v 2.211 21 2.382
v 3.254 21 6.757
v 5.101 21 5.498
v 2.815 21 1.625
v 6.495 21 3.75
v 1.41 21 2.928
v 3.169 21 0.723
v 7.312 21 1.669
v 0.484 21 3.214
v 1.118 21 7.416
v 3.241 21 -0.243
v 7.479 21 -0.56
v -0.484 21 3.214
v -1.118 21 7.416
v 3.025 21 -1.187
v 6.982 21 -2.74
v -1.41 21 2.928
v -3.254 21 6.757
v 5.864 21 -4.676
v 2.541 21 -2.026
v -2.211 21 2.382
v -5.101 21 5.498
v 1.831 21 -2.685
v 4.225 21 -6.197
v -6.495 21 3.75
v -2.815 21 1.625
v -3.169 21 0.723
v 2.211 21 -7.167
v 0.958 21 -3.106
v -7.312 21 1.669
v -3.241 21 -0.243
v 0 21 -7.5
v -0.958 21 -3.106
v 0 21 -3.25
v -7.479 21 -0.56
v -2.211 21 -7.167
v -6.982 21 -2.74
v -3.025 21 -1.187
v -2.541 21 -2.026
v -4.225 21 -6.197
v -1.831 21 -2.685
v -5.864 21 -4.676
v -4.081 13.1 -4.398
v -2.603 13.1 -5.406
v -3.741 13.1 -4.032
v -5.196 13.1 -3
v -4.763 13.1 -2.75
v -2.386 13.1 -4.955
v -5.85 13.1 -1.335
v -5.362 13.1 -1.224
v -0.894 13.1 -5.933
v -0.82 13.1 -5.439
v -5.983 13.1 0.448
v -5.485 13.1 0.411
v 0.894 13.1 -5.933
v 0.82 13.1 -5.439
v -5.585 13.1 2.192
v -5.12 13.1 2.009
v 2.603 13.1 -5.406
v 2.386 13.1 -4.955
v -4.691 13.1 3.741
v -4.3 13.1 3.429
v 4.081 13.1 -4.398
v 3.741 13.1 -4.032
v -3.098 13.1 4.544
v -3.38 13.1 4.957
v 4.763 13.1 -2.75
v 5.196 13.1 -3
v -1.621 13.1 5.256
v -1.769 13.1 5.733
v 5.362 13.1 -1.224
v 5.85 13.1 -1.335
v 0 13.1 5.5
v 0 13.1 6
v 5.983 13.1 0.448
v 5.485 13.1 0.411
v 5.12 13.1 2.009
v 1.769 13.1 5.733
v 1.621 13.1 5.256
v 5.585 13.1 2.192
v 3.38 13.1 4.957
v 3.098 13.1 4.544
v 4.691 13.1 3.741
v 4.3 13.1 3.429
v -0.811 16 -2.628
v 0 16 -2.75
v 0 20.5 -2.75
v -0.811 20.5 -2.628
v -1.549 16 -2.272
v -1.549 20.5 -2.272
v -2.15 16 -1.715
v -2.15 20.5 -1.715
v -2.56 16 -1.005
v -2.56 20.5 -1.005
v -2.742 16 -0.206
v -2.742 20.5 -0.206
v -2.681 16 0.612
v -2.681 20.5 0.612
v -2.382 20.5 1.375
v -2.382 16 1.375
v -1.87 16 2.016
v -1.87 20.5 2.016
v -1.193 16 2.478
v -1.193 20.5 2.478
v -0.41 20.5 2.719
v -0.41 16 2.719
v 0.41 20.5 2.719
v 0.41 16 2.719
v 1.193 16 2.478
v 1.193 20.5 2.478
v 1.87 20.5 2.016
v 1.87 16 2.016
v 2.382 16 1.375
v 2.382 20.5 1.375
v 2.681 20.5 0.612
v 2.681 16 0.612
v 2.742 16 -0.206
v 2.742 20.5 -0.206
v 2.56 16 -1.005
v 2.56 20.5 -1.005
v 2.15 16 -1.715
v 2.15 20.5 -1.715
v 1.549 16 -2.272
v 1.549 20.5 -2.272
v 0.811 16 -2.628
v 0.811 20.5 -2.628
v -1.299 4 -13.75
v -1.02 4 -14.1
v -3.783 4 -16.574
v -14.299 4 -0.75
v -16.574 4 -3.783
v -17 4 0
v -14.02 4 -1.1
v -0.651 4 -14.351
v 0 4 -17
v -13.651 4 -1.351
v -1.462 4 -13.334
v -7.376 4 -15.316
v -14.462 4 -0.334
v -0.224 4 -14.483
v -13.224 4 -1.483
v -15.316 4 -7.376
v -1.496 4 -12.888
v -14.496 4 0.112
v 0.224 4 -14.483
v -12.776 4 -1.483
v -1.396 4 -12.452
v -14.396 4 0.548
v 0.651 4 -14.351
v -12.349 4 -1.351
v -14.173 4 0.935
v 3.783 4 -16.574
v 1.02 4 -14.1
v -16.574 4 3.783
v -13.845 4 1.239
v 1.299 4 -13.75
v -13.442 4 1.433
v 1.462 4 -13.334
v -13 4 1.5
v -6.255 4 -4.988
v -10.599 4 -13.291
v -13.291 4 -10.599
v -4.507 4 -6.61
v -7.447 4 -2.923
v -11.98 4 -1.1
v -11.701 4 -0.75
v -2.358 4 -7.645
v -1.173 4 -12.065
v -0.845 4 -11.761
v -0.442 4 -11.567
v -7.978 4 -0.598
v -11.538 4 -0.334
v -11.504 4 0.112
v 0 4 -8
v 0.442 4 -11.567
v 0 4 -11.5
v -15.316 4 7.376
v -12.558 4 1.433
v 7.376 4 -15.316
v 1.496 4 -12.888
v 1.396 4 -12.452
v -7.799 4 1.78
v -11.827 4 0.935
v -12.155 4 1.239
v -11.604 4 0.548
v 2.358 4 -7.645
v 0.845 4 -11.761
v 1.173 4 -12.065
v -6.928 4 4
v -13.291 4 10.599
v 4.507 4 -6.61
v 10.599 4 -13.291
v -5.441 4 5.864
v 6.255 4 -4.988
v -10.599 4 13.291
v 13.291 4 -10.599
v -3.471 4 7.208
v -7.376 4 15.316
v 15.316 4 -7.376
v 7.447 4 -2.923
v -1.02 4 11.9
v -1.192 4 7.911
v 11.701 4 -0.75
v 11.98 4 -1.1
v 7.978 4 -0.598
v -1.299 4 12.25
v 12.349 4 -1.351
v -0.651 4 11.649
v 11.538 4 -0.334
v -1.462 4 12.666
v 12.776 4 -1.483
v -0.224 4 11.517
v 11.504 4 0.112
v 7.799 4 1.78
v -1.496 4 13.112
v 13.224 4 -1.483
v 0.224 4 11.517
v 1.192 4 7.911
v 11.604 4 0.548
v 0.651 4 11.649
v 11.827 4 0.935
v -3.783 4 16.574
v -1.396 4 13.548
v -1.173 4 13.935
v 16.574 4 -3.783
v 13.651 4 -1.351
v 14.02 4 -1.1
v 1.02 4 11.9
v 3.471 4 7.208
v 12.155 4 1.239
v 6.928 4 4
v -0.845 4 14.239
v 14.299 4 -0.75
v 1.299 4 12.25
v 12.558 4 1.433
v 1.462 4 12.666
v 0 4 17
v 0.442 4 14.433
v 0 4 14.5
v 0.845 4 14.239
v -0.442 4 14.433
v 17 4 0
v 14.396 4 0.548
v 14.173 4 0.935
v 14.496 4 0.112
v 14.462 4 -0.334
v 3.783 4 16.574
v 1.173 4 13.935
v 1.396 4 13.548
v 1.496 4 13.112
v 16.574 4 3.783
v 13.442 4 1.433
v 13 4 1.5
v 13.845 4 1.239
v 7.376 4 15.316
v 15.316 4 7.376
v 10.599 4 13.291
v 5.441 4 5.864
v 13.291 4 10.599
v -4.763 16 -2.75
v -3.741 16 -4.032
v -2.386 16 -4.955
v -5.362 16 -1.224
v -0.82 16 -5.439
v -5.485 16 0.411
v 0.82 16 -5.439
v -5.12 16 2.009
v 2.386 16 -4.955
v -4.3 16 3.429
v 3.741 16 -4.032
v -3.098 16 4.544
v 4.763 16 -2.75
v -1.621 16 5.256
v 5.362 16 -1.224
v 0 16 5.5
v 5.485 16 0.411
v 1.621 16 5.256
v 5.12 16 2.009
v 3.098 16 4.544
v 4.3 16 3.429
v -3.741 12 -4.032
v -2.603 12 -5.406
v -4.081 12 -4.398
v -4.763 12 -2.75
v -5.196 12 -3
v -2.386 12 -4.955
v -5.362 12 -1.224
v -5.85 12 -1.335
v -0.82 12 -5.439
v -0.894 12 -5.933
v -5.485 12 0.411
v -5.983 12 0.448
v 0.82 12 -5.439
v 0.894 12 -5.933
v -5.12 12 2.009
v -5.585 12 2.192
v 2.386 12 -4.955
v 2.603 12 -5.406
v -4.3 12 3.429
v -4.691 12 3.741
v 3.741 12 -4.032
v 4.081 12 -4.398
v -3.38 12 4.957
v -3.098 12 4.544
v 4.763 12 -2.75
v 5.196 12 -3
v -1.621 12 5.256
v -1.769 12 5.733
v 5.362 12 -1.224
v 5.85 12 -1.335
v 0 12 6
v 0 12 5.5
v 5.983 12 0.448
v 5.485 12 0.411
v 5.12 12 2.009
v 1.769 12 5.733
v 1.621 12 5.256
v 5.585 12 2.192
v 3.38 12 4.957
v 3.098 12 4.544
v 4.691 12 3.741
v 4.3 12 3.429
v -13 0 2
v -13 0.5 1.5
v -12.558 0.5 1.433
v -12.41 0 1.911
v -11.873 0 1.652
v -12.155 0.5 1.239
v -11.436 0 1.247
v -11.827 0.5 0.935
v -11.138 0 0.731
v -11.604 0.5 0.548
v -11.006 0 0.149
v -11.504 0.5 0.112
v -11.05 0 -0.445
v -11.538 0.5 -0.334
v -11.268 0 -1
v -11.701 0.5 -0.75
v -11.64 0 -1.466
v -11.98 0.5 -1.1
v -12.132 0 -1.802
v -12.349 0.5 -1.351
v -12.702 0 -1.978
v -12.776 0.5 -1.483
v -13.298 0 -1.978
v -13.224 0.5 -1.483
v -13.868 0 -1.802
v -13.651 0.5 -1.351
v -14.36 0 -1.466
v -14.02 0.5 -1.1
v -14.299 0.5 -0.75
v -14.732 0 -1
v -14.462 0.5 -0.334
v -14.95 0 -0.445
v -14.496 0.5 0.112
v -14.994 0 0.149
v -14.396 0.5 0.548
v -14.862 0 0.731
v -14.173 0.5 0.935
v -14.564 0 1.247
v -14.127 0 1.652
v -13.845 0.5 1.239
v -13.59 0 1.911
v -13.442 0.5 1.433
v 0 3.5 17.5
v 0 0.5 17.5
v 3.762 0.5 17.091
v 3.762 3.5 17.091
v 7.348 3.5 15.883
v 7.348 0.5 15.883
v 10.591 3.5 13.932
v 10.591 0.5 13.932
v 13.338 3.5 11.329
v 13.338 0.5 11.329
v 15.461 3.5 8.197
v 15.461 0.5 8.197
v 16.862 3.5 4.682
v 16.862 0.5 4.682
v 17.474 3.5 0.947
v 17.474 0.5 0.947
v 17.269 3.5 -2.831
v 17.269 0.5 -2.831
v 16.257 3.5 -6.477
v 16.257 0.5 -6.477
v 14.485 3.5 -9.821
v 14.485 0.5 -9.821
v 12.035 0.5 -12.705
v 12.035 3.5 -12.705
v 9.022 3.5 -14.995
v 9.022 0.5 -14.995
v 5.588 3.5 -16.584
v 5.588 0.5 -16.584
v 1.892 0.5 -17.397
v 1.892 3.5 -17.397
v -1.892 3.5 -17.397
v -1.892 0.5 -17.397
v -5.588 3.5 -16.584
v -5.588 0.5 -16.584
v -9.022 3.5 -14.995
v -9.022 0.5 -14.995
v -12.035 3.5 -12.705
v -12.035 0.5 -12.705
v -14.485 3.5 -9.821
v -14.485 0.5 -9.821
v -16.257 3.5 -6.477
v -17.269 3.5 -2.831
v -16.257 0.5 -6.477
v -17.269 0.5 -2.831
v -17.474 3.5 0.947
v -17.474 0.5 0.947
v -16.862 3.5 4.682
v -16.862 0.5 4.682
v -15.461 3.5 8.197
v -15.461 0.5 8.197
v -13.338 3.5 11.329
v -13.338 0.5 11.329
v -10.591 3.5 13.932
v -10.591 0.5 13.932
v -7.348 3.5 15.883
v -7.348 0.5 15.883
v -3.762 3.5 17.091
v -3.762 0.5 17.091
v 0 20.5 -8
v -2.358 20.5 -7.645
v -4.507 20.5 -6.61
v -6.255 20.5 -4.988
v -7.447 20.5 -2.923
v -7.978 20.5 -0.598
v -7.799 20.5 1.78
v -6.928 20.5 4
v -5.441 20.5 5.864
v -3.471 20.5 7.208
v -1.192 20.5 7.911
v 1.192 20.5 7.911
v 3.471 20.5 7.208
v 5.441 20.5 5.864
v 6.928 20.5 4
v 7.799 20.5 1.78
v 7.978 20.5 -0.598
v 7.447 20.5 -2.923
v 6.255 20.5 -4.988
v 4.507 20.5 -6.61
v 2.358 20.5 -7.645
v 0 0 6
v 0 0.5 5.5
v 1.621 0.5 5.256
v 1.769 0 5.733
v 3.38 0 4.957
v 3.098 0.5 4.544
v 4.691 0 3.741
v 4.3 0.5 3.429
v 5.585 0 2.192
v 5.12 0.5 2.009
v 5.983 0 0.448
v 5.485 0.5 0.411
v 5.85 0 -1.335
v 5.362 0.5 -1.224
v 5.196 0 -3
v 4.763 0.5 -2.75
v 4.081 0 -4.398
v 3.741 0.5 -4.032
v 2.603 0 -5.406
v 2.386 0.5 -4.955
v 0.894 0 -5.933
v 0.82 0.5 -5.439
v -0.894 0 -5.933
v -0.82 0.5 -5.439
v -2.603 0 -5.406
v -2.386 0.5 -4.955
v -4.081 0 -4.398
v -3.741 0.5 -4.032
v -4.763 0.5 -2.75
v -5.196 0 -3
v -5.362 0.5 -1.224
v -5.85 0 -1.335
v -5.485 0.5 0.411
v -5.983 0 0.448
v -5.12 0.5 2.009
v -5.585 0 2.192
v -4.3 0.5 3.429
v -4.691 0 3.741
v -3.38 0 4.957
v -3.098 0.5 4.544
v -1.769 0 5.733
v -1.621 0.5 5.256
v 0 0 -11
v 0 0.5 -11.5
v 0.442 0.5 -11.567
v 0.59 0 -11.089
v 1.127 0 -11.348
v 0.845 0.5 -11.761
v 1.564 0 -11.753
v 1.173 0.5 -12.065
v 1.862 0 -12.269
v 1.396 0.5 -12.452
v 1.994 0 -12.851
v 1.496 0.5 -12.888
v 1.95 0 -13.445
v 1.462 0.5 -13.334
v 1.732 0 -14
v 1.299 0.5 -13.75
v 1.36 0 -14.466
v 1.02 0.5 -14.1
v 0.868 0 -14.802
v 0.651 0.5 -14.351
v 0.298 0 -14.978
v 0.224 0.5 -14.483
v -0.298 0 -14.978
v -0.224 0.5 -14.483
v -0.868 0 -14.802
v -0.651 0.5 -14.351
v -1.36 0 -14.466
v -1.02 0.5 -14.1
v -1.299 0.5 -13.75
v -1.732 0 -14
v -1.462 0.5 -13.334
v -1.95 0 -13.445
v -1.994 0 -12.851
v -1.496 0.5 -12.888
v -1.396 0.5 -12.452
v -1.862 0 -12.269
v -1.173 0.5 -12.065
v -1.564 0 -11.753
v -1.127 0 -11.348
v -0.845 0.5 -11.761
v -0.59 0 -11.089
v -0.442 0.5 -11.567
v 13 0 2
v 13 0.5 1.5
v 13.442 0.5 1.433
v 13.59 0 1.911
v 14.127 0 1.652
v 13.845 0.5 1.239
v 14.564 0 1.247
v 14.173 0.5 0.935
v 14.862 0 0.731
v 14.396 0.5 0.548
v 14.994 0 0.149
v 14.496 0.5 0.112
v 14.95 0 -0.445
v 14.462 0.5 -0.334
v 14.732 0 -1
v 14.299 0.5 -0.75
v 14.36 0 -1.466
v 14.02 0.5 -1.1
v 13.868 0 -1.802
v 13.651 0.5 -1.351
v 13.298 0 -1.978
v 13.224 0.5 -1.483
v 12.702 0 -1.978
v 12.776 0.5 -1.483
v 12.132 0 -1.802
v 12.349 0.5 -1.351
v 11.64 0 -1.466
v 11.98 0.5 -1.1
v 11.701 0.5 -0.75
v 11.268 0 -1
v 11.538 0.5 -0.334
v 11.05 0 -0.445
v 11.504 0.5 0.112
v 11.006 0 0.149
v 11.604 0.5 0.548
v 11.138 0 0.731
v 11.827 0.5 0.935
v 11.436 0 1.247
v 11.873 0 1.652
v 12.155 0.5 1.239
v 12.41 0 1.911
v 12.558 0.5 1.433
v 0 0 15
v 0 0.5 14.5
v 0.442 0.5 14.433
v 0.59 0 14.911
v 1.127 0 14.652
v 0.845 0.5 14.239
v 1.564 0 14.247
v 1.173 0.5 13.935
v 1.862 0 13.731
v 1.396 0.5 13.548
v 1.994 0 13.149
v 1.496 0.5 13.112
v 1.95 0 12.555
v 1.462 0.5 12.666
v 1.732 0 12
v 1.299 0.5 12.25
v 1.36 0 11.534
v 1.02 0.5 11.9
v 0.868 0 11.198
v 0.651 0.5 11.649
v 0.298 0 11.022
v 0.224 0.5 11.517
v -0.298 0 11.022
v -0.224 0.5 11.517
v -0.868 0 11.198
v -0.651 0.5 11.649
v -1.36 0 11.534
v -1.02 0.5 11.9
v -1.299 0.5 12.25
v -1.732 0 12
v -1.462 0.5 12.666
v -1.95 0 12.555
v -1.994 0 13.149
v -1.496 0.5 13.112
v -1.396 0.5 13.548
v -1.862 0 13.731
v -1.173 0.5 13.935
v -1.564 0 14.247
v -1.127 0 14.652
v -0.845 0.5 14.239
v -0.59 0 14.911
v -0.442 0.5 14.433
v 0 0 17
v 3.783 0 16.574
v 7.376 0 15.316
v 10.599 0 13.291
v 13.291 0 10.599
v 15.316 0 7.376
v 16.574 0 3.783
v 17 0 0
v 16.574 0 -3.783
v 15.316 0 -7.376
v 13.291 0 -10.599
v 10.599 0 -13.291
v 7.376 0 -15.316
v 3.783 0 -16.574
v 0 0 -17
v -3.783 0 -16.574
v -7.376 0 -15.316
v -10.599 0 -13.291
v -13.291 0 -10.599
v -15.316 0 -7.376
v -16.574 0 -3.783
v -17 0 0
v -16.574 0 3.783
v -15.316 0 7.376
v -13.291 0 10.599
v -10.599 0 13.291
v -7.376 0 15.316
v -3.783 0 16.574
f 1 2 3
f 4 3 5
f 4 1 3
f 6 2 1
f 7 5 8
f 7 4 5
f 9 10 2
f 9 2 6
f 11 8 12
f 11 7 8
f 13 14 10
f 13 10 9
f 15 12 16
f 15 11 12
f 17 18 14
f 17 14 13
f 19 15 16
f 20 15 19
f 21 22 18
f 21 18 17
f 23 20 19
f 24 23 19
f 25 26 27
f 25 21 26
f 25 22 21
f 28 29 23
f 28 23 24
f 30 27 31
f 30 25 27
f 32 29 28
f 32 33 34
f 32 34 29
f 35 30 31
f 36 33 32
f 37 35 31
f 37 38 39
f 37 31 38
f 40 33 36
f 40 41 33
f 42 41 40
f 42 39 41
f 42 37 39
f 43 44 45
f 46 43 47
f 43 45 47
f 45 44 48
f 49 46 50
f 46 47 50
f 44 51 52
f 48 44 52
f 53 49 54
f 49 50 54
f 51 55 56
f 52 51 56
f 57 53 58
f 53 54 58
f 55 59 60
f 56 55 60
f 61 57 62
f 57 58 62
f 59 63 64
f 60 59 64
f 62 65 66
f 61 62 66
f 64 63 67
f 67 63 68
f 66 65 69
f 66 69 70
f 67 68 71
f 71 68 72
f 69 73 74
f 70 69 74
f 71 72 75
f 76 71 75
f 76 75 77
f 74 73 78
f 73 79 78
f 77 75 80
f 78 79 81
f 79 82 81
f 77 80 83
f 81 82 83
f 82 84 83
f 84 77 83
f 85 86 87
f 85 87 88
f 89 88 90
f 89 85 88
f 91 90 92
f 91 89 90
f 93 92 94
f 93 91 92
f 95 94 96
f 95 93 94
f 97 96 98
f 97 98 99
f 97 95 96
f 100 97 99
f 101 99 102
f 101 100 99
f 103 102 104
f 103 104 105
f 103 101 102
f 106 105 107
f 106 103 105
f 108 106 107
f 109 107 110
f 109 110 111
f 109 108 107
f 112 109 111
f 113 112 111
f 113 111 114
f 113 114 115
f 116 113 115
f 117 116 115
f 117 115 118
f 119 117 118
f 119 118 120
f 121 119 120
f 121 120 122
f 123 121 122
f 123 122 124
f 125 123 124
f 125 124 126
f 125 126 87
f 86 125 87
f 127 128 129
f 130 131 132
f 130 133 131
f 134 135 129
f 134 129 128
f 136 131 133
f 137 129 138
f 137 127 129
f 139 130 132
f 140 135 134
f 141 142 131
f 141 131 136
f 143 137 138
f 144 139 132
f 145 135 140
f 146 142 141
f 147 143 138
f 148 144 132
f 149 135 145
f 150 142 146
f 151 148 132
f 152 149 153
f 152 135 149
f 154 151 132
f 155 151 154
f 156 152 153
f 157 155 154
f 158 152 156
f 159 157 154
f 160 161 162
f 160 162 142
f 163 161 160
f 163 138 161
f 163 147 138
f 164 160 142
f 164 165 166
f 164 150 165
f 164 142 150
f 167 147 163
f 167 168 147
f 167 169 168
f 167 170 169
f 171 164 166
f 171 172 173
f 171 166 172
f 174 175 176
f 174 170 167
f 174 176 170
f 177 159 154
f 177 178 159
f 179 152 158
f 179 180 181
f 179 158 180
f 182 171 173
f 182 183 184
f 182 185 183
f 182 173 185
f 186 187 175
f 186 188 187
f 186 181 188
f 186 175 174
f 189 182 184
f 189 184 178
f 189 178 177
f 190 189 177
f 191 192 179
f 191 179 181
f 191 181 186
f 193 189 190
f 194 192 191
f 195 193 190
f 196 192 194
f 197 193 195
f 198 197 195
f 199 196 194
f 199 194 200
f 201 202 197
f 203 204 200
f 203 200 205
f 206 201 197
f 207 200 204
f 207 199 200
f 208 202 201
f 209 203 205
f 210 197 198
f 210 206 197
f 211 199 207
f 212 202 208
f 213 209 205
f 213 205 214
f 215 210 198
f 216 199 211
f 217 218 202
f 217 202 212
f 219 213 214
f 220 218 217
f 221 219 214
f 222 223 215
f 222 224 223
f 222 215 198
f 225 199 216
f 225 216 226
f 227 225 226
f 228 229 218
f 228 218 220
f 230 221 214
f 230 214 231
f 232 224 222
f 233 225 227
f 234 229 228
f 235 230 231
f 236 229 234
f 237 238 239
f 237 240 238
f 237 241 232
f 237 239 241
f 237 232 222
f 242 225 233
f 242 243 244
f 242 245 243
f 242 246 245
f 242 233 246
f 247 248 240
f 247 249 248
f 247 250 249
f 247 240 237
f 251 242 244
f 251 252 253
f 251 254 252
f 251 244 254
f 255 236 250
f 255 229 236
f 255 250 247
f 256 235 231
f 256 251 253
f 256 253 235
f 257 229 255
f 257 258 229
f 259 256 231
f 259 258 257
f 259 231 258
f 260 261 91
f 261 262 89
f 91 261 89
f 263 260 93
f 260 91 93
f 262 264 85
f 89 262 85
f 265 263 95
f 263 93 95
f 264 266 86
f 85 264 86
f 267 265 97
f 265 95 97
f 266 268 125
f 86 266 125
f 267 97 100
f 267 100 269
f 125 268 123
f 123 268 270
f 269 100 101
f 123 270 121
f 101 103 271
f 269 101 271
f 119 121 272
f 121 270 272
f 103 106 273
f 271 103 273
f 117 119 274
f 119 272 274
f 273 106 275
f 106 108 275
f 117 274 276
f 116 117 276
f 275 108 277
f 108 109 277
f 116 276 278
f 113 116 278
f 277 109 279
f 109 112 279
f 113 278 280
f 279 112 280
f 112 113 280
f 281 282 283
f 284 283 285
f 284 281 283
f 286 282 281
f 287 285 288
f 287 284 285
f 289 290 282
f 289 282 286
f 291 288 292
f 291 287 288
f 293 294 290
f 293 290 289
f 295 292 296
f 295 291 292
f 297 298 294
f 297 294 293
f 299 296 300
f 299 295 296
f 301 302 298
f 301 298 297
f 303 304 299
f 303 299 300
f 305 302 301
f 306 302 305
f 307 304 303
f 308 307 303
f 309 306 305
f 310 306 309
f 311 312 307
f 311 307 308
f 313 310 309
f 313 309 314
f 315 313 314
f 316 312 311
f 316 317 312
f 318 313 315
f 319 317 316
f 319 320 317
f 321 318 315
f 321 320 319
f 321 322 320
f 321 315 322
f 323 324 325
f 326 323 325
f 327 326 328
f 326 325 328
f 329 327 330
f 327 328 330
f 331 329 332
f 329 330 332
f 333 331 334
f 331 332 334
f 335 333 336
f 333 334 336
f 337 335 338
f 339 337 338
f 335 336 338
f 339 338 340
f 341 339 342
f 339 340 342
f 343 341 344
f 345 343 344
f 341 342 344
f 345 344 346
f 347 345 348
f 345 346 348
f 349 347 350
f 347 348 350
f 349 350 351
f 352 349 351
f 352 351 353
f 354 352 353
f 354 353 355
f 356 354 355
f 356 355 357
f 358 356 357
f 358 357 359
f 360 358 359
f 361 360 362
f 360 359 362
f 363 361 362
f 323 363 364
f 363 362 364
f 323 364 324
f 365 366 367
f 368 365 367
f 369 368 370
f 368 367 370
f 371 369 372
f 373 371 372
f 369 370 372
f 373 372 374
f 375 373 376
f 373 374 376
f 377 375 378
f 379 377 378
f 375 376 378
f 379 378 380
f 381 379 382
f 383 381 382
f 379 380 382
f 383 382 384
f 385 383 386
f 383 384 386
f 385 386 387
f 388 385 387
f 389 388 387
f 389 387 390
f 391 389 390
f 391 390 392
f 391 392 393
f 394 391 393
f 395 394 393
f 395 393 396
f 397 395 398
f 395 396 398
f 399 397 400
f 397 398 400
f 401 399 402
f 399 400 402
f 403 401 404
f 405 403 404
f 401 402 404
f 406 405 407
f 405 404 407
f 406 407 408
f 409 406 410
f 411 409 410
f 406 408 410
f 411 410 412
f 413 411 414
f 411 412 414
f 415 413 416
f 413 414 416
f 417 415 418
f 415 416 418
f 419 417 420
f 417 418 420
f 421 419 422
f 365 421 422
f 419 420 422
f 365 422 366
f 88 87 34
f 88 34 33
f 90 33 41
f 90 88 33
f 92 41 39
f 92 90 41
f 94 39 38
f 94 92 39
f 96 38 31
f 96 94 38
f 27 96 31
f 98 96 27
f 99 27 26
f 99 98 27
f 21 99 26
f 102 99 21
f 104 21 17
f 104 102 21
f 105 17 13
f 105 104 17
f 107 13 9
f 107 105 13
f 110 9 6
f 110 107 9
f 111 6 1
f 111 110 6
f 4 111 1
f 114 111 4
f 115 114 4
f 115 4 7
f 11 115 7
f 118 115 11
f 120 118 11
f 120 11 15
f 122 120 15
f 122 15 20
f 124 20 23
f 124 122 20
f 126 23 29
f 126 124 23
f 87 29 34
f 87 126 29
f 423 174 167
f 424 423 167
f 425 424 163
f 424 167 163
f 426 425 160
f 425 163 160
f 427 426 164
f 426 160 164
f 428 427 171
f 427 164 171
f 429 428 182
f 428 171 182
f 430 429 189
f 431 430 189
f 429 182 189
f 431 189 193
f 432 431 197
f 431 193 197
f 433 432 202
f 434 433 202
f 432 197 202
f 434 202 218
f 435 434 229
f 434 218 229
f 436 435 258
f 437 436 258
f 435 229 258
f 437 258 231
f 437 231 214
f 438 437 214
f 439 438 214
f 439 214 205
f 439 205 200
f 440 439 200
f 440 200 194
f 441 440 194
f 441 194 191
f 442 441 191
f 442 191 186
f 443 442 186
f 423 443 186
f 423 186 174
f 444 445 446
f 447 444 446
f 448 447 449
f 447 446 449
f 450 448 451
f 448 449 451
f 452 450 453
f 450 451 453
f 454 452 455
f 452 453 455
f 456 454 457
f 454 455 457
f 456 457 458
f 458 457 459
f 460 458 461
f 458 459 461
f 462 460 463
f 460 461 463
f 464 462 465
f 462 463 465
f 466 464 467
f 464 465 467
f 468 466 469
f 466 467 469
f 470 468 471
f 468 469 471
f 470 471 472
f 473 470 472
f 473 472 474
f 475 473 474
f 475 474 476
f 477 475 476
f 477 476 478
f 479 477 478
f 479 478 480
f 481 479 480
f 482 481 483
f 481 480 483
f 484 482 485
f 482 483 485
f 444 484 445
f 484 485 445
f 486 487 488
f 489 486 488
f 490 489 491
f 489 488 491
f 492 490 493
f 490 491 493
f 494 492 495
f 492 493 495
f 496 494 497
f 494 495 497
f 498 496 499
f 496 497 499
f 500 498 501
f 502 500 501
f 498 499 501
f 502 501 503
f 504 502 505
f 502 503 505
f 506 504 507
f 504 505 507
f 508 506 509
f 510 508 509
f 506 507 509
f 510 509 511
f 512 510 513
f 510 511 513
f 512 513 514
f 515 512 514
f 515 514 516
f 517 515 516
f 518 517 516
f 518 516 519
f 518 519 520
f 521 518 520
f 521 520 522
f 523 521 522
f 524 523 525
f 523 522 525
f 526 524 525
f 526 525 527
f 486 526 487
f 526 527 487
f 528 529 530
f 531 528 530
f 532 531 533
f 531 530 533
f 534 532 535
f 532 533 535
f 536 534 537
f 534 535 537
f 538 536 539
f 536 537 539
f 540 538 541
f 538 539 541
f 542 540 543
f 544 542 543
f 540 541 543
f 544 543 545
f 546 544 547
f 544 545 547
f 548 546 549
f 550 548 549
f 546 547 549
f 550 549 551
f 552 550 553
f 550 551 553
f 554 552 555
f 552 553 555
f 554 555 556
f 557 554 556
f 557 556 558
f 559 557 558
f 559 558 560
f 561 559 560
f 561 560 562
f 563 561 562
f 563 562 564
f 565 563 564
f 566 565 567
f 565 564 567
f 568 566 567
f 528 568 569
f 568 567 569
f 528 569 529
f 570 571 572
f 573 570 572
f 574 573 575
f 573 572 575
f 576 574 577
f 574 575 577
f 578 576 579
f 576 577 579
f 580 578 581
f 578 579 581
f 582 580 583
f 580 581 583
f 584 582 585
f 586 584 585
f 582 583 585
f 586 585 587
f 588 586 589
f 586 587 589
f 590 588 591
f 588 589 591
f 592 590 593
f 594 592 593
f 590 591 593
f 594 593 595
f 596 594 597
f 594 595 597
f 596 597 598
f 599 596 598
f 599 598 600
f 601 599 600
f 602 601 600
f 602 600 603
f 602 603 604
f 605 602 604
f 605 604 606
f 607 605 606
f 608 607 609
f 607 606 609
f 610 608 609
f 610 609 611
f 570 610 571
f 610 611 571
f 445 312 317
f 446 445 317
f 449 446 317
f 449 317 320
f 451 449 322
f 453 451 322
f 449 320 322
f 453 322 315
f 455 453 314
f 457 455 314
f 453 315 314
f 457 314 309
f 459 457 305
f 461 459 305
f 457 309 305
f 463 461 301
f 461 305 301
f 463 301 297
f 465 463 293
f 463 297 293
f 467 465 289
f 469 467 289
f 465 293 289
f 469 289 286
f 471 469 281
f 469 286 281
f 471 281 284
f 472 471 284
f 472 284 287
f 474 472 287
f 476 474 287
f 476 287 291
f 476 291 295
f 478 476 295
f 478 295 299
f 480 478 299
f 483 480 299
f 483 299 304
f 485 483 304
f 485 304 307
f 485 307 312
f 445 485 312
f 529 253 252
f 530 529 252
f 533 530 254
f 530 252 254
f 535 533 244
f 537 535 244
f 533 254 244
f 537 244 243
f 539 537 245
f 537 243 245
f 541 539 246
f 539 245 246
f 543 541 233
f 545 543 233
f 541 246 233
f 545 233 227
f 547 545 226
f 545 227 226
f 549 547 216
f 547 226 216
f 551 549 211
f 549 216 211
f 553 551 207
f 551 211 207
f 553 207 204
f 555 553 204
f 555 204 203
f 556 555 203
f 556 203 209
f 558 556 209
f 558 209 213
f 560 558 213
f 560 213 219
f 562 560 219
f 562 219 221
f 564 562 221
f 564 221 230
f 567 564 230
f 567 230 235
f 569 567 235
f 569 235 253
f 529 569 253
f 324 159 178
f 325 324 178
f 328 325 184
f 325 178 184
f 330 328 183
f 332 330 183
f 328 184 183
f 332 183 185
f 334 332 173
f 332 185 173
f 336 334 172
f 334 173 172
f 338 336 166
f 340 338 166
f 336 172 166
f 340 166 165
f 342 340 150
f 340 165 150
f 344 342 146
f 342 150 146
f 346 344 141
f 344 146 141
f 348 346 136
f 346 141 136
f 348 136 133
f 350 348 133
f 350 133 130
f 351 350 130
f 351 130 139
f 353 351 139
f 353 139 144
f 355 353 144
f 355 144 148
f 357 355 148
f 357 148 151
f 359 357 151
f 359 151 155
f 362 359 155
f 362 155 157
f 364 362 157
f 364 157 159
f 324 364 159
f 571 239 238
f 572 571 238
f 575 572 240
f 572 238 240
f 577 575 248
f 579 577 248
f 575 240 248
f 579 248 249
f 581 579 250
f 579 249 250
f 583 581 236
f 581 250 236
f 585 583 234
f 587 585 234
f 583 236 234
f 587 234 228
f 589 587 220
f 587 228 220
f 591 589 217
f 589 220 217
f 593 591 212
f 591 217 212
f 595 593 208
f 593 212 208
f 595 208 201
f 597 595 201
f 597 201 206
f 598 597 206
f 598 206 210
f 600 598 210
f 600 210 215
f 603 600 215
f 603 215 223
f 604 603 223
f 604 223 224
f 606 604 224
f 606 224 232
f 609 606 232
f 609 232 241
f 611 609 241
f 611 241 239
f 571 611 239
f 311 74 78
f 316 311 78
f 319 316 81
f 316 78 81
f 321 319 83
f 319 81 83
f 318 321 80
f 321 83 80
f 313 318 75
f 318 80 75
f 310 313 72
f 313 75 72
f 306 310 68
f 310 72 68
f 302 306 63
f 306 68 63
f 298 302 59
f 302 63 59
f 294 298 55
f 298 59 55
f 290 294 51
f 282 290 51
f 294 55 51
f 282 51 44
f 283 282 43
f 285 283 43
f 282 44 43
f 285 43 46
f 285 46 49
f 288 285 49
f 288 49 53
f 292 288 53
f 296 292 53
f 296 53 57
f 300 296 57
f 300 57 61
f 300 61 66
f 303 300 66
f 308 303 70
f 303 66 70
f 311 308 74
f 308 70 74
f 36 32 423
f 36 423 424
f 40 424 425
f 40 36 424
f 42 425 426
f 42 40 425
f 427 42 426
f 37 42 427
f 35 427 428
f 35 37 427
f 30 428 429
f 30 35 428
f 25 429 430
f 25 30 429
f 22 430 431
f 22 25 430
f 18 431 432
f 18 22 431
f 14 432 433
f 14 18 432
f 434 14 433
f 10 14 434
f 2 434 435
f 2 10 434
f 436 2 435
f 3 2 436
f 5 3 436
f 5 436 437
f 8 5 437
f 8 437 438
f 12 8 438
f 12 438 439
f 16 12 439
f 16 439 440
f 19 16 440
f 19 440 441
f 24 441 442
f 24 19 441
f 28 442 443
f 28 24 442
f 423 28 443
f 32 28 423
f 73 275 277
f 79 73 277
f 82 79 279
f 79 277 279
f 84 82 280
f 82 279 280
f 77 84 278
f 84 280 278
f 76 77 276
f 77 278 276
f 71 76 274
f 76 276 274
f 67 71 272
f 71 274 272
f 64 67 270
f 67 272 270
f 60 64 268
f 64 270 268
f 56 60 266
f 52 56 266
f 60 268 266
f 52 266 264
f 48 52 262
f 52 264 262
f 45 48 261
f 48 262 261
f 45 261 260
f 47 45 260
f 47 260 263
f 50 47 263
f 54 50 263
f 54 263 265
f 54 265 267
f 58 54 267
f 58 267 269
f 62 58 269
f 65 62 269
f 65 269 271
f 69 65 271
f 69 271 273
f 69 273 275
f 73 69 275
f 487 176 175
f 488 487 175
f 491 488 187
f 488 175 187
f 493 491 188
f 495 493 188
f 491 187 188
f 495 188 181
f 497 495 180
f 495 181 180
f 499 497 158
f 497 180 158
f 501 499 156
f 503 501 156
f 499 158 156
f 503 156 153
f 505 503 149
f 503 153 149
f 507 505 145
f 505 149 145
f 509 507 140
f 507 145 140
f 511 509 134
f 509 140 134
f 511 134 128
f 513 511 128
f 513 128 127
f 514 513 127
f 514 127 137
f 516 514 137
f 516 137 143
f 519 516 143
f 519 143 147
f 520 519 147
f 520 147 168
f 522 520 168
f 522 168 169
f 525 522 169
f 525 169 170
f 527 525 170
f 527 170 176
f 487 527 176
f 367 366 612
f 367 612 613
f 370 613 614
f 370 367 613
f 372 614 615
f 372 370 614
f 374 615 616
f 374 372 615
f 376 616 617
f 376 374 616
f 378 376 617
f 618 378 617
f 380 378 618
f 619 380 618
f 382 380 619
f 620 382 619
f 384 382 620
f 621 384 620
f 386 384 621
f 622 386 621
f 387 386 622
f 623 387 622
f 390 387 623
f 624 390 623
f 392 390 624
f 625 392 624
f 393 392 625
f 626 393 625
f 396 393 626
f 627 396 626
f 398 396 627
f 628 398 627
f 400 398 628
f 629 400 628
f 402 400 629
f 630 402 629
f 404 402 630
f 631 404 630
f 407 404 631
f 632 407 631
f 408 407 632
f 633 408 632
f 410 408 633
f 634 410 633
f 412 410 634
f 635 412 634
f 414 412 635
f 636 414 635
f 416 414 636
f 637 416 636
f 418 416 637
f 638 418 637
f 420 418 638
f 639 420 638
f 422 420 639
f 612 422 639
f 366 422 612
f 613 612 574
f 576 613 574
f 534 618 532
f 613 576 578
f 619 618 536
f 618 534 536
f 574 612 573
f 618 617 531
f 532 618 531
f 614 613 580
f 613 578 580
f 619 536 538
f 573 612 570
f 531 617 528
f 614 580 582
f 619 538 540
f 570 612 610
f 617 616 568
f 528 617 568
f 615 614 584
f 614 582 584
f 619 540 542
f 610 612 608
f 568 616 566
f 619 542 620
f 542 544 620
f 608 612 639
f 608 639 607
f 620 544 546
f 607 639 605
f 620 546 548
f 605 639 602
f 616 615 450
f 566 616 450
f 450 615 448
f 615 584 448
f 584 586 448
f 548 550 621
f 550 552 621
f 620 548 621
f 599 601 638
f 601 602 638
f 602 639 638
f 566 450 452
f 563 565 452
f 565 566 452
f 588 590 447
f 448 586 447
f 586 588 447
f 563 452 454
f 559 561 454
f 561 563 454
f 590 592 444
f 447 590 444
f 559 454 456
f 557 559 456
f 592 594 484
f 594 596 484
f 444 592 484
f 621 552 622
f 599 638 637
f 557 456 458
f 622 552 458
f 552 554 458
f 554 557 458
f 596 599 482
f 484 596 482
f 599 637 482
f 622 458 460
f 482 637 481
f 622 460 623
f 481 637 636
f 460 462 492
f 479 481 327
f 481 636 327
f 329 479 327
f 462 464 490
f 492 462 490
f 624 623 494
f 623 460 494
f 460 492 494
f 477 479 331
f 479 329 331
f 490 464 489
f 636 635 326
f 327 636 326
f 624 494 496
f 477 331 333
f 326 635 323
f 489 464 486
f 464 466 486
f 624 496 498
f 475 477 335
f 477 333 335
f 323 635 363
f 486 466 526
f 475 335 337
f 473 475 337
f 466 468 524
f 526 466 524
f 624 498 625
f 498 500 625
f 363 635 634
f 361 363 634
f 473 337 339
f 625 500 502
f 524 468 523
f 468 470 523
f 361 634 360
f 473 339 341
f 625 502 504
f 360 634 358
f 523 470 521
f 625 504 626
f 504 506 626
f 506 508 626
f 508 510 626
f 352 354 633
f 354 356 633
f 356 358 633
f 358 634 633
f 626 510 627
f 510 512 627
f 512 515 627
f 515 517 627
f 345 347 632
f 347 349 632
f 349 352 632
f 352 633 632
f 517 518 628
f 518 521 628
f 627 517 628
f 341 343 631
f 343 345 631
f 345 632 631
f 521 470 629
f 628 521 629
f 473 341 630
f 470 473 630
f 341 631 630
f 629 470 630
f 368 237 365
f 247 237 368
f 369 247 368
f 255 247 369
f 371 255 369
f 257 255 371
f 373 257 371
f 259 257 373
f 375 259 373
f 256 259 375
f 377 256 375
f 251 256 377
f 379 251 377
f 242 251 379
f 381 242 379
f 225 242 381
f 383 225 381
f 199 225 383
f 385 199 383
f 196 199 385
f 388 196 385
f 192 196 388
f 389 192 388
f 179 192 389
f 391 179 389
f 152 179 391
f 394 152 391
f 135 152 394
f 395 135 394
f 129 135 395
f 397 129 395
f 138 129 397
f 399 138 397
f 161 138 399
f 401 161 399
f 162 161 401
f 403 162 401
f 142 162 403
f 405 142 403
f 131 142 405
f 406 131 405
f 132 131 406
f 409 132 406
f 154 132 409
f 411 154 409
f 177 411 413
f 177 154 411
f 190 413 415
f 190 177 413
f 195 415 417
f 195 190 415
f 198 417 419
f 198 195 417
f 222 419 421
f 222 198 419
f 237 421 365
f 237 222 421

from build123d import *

# Parameters (mm, degrees)
SKETCH1_R           = 17.5
BOSS_EXTRUDE1_DEPTH = 4
SKETCH1_3_R         = 8
SKETCH1_3_R_2       = 2.75
BOSS_EXTRUDE2_DEPTH = 4
SKETCH1_4_R         = 8
SKETCH1_4_R_2       = 2.75
BOSS_EXTRUDE3_DEPTH = 21
SKETCH2_R           = 5.5
CUT_EXTRUDE1_DEPTH  = 21
SKETCH4_R           = 6
CUT_EXTRUDE2_DEPTH  = 1.1
SKETCH5_R           = 1.5
CUT_EXTRUDE3_DEPTH  = 21.1
CHAMFER1_SIZE       = 0.5


with BuildPart() as part:
    # Sketch1 → Boss-Extrude1 (new body)
    with BuildSketch(Plane(origin=(0, 0, 0), x_dir=(1, 0, 0), z_dir=(0, 1, 0))):
        Circle(SKETCH1_R)
    extrude(amount=BOSS_EXTRUDE1_DEPTH)

    # Sketch1<3> → Boss-Extrude2 (add)
    with BuildSketch(Plane(origin=(0, 0, 0), x_dir=(1, 0, 0), z_dir=(0, 1, 0))):
        Circle(SKETCH1_3_R)
        Circle(SKETCH1_3_R_2, mode=Mode.SUBTRACT)
    extrude(amount=BOSS_EXTRUDE2_DEPTH)

    # Sketch1<4> → Boss-Extrude3 (add)
    with BuildSketch(Plane(origin=(0, 0, 0), x_dir=(1, 0, 0), z_dir=(0, 1, 0))):
        Circle(SKETCH1_4_R)
        Circle(SKETCH1_4_R_2, mode=Mode.SUBTRACT)
    extrude(amount=BOSS_EXTRUDE3_DEPTH)

    # Sketch2 → Cut-Extrude1 (cut)
    with BuildSketch(Plane(origin=(0, 16, 0), x_dir=(1, 0, 0), z_dir=(0, 1, 0))):
        Circle(SKETCH2_R)
    extrude(amount=-CUT_EXTRUDE1_DEPTH, mode=Mode.SUBTRACT)

    # Sketch4 → Cut-Extrude2 (cut)
    with BuildSketch(Plane(origin=(0, 13.1, 0), x_dir=(1, 0, 0), z_dir=(0, 1, 0))):
        Circle(SKETCH4_R)
    extrude(amount=-CUT_EXTRUDE2_DEPTH, mode=Mode.SUBTRACT)

    # Sketch5 → Cut-Extrude3 (cut)
    with BuildSketch(Plane(origin=(0, 4, 0), x_dir=(1, 0, 0), z_dir=(0, 1, 0))):
        with Locations((0, 13)):
            Circle(SKETCH5_R)
        with Locations((13, 0)):
            Circle(SKETCH5_R)
        with Locations((0, -13)):
            Circle(SKETCH5_R)
        with Locations((-13, 0)):
            Circle(SKETCH5_R)
    extrude(amount=-CUT_EXTRUDE3_DEPTH, mode=Mode.SUBTRACT)

    # Chamfer1
    chamfer1_edges = [part.edges().sort_by_distance(p)[0] for p in [
        (-17.5, 0, 0),
        (-5.5, 0, 0),
        (-14.5, 0, 0),
        (-1.5, 0, 13),
        (11.5, 0, 0),
        (-1.5, 0, -13),
        (-2.75, 21, 0),
        (-8, 21, 0),
        (-17.5, 4, 0),
    ]]
    chamfer(chamfer1_edges, length=CHAMFER1_SIZE)


solid = part.part
